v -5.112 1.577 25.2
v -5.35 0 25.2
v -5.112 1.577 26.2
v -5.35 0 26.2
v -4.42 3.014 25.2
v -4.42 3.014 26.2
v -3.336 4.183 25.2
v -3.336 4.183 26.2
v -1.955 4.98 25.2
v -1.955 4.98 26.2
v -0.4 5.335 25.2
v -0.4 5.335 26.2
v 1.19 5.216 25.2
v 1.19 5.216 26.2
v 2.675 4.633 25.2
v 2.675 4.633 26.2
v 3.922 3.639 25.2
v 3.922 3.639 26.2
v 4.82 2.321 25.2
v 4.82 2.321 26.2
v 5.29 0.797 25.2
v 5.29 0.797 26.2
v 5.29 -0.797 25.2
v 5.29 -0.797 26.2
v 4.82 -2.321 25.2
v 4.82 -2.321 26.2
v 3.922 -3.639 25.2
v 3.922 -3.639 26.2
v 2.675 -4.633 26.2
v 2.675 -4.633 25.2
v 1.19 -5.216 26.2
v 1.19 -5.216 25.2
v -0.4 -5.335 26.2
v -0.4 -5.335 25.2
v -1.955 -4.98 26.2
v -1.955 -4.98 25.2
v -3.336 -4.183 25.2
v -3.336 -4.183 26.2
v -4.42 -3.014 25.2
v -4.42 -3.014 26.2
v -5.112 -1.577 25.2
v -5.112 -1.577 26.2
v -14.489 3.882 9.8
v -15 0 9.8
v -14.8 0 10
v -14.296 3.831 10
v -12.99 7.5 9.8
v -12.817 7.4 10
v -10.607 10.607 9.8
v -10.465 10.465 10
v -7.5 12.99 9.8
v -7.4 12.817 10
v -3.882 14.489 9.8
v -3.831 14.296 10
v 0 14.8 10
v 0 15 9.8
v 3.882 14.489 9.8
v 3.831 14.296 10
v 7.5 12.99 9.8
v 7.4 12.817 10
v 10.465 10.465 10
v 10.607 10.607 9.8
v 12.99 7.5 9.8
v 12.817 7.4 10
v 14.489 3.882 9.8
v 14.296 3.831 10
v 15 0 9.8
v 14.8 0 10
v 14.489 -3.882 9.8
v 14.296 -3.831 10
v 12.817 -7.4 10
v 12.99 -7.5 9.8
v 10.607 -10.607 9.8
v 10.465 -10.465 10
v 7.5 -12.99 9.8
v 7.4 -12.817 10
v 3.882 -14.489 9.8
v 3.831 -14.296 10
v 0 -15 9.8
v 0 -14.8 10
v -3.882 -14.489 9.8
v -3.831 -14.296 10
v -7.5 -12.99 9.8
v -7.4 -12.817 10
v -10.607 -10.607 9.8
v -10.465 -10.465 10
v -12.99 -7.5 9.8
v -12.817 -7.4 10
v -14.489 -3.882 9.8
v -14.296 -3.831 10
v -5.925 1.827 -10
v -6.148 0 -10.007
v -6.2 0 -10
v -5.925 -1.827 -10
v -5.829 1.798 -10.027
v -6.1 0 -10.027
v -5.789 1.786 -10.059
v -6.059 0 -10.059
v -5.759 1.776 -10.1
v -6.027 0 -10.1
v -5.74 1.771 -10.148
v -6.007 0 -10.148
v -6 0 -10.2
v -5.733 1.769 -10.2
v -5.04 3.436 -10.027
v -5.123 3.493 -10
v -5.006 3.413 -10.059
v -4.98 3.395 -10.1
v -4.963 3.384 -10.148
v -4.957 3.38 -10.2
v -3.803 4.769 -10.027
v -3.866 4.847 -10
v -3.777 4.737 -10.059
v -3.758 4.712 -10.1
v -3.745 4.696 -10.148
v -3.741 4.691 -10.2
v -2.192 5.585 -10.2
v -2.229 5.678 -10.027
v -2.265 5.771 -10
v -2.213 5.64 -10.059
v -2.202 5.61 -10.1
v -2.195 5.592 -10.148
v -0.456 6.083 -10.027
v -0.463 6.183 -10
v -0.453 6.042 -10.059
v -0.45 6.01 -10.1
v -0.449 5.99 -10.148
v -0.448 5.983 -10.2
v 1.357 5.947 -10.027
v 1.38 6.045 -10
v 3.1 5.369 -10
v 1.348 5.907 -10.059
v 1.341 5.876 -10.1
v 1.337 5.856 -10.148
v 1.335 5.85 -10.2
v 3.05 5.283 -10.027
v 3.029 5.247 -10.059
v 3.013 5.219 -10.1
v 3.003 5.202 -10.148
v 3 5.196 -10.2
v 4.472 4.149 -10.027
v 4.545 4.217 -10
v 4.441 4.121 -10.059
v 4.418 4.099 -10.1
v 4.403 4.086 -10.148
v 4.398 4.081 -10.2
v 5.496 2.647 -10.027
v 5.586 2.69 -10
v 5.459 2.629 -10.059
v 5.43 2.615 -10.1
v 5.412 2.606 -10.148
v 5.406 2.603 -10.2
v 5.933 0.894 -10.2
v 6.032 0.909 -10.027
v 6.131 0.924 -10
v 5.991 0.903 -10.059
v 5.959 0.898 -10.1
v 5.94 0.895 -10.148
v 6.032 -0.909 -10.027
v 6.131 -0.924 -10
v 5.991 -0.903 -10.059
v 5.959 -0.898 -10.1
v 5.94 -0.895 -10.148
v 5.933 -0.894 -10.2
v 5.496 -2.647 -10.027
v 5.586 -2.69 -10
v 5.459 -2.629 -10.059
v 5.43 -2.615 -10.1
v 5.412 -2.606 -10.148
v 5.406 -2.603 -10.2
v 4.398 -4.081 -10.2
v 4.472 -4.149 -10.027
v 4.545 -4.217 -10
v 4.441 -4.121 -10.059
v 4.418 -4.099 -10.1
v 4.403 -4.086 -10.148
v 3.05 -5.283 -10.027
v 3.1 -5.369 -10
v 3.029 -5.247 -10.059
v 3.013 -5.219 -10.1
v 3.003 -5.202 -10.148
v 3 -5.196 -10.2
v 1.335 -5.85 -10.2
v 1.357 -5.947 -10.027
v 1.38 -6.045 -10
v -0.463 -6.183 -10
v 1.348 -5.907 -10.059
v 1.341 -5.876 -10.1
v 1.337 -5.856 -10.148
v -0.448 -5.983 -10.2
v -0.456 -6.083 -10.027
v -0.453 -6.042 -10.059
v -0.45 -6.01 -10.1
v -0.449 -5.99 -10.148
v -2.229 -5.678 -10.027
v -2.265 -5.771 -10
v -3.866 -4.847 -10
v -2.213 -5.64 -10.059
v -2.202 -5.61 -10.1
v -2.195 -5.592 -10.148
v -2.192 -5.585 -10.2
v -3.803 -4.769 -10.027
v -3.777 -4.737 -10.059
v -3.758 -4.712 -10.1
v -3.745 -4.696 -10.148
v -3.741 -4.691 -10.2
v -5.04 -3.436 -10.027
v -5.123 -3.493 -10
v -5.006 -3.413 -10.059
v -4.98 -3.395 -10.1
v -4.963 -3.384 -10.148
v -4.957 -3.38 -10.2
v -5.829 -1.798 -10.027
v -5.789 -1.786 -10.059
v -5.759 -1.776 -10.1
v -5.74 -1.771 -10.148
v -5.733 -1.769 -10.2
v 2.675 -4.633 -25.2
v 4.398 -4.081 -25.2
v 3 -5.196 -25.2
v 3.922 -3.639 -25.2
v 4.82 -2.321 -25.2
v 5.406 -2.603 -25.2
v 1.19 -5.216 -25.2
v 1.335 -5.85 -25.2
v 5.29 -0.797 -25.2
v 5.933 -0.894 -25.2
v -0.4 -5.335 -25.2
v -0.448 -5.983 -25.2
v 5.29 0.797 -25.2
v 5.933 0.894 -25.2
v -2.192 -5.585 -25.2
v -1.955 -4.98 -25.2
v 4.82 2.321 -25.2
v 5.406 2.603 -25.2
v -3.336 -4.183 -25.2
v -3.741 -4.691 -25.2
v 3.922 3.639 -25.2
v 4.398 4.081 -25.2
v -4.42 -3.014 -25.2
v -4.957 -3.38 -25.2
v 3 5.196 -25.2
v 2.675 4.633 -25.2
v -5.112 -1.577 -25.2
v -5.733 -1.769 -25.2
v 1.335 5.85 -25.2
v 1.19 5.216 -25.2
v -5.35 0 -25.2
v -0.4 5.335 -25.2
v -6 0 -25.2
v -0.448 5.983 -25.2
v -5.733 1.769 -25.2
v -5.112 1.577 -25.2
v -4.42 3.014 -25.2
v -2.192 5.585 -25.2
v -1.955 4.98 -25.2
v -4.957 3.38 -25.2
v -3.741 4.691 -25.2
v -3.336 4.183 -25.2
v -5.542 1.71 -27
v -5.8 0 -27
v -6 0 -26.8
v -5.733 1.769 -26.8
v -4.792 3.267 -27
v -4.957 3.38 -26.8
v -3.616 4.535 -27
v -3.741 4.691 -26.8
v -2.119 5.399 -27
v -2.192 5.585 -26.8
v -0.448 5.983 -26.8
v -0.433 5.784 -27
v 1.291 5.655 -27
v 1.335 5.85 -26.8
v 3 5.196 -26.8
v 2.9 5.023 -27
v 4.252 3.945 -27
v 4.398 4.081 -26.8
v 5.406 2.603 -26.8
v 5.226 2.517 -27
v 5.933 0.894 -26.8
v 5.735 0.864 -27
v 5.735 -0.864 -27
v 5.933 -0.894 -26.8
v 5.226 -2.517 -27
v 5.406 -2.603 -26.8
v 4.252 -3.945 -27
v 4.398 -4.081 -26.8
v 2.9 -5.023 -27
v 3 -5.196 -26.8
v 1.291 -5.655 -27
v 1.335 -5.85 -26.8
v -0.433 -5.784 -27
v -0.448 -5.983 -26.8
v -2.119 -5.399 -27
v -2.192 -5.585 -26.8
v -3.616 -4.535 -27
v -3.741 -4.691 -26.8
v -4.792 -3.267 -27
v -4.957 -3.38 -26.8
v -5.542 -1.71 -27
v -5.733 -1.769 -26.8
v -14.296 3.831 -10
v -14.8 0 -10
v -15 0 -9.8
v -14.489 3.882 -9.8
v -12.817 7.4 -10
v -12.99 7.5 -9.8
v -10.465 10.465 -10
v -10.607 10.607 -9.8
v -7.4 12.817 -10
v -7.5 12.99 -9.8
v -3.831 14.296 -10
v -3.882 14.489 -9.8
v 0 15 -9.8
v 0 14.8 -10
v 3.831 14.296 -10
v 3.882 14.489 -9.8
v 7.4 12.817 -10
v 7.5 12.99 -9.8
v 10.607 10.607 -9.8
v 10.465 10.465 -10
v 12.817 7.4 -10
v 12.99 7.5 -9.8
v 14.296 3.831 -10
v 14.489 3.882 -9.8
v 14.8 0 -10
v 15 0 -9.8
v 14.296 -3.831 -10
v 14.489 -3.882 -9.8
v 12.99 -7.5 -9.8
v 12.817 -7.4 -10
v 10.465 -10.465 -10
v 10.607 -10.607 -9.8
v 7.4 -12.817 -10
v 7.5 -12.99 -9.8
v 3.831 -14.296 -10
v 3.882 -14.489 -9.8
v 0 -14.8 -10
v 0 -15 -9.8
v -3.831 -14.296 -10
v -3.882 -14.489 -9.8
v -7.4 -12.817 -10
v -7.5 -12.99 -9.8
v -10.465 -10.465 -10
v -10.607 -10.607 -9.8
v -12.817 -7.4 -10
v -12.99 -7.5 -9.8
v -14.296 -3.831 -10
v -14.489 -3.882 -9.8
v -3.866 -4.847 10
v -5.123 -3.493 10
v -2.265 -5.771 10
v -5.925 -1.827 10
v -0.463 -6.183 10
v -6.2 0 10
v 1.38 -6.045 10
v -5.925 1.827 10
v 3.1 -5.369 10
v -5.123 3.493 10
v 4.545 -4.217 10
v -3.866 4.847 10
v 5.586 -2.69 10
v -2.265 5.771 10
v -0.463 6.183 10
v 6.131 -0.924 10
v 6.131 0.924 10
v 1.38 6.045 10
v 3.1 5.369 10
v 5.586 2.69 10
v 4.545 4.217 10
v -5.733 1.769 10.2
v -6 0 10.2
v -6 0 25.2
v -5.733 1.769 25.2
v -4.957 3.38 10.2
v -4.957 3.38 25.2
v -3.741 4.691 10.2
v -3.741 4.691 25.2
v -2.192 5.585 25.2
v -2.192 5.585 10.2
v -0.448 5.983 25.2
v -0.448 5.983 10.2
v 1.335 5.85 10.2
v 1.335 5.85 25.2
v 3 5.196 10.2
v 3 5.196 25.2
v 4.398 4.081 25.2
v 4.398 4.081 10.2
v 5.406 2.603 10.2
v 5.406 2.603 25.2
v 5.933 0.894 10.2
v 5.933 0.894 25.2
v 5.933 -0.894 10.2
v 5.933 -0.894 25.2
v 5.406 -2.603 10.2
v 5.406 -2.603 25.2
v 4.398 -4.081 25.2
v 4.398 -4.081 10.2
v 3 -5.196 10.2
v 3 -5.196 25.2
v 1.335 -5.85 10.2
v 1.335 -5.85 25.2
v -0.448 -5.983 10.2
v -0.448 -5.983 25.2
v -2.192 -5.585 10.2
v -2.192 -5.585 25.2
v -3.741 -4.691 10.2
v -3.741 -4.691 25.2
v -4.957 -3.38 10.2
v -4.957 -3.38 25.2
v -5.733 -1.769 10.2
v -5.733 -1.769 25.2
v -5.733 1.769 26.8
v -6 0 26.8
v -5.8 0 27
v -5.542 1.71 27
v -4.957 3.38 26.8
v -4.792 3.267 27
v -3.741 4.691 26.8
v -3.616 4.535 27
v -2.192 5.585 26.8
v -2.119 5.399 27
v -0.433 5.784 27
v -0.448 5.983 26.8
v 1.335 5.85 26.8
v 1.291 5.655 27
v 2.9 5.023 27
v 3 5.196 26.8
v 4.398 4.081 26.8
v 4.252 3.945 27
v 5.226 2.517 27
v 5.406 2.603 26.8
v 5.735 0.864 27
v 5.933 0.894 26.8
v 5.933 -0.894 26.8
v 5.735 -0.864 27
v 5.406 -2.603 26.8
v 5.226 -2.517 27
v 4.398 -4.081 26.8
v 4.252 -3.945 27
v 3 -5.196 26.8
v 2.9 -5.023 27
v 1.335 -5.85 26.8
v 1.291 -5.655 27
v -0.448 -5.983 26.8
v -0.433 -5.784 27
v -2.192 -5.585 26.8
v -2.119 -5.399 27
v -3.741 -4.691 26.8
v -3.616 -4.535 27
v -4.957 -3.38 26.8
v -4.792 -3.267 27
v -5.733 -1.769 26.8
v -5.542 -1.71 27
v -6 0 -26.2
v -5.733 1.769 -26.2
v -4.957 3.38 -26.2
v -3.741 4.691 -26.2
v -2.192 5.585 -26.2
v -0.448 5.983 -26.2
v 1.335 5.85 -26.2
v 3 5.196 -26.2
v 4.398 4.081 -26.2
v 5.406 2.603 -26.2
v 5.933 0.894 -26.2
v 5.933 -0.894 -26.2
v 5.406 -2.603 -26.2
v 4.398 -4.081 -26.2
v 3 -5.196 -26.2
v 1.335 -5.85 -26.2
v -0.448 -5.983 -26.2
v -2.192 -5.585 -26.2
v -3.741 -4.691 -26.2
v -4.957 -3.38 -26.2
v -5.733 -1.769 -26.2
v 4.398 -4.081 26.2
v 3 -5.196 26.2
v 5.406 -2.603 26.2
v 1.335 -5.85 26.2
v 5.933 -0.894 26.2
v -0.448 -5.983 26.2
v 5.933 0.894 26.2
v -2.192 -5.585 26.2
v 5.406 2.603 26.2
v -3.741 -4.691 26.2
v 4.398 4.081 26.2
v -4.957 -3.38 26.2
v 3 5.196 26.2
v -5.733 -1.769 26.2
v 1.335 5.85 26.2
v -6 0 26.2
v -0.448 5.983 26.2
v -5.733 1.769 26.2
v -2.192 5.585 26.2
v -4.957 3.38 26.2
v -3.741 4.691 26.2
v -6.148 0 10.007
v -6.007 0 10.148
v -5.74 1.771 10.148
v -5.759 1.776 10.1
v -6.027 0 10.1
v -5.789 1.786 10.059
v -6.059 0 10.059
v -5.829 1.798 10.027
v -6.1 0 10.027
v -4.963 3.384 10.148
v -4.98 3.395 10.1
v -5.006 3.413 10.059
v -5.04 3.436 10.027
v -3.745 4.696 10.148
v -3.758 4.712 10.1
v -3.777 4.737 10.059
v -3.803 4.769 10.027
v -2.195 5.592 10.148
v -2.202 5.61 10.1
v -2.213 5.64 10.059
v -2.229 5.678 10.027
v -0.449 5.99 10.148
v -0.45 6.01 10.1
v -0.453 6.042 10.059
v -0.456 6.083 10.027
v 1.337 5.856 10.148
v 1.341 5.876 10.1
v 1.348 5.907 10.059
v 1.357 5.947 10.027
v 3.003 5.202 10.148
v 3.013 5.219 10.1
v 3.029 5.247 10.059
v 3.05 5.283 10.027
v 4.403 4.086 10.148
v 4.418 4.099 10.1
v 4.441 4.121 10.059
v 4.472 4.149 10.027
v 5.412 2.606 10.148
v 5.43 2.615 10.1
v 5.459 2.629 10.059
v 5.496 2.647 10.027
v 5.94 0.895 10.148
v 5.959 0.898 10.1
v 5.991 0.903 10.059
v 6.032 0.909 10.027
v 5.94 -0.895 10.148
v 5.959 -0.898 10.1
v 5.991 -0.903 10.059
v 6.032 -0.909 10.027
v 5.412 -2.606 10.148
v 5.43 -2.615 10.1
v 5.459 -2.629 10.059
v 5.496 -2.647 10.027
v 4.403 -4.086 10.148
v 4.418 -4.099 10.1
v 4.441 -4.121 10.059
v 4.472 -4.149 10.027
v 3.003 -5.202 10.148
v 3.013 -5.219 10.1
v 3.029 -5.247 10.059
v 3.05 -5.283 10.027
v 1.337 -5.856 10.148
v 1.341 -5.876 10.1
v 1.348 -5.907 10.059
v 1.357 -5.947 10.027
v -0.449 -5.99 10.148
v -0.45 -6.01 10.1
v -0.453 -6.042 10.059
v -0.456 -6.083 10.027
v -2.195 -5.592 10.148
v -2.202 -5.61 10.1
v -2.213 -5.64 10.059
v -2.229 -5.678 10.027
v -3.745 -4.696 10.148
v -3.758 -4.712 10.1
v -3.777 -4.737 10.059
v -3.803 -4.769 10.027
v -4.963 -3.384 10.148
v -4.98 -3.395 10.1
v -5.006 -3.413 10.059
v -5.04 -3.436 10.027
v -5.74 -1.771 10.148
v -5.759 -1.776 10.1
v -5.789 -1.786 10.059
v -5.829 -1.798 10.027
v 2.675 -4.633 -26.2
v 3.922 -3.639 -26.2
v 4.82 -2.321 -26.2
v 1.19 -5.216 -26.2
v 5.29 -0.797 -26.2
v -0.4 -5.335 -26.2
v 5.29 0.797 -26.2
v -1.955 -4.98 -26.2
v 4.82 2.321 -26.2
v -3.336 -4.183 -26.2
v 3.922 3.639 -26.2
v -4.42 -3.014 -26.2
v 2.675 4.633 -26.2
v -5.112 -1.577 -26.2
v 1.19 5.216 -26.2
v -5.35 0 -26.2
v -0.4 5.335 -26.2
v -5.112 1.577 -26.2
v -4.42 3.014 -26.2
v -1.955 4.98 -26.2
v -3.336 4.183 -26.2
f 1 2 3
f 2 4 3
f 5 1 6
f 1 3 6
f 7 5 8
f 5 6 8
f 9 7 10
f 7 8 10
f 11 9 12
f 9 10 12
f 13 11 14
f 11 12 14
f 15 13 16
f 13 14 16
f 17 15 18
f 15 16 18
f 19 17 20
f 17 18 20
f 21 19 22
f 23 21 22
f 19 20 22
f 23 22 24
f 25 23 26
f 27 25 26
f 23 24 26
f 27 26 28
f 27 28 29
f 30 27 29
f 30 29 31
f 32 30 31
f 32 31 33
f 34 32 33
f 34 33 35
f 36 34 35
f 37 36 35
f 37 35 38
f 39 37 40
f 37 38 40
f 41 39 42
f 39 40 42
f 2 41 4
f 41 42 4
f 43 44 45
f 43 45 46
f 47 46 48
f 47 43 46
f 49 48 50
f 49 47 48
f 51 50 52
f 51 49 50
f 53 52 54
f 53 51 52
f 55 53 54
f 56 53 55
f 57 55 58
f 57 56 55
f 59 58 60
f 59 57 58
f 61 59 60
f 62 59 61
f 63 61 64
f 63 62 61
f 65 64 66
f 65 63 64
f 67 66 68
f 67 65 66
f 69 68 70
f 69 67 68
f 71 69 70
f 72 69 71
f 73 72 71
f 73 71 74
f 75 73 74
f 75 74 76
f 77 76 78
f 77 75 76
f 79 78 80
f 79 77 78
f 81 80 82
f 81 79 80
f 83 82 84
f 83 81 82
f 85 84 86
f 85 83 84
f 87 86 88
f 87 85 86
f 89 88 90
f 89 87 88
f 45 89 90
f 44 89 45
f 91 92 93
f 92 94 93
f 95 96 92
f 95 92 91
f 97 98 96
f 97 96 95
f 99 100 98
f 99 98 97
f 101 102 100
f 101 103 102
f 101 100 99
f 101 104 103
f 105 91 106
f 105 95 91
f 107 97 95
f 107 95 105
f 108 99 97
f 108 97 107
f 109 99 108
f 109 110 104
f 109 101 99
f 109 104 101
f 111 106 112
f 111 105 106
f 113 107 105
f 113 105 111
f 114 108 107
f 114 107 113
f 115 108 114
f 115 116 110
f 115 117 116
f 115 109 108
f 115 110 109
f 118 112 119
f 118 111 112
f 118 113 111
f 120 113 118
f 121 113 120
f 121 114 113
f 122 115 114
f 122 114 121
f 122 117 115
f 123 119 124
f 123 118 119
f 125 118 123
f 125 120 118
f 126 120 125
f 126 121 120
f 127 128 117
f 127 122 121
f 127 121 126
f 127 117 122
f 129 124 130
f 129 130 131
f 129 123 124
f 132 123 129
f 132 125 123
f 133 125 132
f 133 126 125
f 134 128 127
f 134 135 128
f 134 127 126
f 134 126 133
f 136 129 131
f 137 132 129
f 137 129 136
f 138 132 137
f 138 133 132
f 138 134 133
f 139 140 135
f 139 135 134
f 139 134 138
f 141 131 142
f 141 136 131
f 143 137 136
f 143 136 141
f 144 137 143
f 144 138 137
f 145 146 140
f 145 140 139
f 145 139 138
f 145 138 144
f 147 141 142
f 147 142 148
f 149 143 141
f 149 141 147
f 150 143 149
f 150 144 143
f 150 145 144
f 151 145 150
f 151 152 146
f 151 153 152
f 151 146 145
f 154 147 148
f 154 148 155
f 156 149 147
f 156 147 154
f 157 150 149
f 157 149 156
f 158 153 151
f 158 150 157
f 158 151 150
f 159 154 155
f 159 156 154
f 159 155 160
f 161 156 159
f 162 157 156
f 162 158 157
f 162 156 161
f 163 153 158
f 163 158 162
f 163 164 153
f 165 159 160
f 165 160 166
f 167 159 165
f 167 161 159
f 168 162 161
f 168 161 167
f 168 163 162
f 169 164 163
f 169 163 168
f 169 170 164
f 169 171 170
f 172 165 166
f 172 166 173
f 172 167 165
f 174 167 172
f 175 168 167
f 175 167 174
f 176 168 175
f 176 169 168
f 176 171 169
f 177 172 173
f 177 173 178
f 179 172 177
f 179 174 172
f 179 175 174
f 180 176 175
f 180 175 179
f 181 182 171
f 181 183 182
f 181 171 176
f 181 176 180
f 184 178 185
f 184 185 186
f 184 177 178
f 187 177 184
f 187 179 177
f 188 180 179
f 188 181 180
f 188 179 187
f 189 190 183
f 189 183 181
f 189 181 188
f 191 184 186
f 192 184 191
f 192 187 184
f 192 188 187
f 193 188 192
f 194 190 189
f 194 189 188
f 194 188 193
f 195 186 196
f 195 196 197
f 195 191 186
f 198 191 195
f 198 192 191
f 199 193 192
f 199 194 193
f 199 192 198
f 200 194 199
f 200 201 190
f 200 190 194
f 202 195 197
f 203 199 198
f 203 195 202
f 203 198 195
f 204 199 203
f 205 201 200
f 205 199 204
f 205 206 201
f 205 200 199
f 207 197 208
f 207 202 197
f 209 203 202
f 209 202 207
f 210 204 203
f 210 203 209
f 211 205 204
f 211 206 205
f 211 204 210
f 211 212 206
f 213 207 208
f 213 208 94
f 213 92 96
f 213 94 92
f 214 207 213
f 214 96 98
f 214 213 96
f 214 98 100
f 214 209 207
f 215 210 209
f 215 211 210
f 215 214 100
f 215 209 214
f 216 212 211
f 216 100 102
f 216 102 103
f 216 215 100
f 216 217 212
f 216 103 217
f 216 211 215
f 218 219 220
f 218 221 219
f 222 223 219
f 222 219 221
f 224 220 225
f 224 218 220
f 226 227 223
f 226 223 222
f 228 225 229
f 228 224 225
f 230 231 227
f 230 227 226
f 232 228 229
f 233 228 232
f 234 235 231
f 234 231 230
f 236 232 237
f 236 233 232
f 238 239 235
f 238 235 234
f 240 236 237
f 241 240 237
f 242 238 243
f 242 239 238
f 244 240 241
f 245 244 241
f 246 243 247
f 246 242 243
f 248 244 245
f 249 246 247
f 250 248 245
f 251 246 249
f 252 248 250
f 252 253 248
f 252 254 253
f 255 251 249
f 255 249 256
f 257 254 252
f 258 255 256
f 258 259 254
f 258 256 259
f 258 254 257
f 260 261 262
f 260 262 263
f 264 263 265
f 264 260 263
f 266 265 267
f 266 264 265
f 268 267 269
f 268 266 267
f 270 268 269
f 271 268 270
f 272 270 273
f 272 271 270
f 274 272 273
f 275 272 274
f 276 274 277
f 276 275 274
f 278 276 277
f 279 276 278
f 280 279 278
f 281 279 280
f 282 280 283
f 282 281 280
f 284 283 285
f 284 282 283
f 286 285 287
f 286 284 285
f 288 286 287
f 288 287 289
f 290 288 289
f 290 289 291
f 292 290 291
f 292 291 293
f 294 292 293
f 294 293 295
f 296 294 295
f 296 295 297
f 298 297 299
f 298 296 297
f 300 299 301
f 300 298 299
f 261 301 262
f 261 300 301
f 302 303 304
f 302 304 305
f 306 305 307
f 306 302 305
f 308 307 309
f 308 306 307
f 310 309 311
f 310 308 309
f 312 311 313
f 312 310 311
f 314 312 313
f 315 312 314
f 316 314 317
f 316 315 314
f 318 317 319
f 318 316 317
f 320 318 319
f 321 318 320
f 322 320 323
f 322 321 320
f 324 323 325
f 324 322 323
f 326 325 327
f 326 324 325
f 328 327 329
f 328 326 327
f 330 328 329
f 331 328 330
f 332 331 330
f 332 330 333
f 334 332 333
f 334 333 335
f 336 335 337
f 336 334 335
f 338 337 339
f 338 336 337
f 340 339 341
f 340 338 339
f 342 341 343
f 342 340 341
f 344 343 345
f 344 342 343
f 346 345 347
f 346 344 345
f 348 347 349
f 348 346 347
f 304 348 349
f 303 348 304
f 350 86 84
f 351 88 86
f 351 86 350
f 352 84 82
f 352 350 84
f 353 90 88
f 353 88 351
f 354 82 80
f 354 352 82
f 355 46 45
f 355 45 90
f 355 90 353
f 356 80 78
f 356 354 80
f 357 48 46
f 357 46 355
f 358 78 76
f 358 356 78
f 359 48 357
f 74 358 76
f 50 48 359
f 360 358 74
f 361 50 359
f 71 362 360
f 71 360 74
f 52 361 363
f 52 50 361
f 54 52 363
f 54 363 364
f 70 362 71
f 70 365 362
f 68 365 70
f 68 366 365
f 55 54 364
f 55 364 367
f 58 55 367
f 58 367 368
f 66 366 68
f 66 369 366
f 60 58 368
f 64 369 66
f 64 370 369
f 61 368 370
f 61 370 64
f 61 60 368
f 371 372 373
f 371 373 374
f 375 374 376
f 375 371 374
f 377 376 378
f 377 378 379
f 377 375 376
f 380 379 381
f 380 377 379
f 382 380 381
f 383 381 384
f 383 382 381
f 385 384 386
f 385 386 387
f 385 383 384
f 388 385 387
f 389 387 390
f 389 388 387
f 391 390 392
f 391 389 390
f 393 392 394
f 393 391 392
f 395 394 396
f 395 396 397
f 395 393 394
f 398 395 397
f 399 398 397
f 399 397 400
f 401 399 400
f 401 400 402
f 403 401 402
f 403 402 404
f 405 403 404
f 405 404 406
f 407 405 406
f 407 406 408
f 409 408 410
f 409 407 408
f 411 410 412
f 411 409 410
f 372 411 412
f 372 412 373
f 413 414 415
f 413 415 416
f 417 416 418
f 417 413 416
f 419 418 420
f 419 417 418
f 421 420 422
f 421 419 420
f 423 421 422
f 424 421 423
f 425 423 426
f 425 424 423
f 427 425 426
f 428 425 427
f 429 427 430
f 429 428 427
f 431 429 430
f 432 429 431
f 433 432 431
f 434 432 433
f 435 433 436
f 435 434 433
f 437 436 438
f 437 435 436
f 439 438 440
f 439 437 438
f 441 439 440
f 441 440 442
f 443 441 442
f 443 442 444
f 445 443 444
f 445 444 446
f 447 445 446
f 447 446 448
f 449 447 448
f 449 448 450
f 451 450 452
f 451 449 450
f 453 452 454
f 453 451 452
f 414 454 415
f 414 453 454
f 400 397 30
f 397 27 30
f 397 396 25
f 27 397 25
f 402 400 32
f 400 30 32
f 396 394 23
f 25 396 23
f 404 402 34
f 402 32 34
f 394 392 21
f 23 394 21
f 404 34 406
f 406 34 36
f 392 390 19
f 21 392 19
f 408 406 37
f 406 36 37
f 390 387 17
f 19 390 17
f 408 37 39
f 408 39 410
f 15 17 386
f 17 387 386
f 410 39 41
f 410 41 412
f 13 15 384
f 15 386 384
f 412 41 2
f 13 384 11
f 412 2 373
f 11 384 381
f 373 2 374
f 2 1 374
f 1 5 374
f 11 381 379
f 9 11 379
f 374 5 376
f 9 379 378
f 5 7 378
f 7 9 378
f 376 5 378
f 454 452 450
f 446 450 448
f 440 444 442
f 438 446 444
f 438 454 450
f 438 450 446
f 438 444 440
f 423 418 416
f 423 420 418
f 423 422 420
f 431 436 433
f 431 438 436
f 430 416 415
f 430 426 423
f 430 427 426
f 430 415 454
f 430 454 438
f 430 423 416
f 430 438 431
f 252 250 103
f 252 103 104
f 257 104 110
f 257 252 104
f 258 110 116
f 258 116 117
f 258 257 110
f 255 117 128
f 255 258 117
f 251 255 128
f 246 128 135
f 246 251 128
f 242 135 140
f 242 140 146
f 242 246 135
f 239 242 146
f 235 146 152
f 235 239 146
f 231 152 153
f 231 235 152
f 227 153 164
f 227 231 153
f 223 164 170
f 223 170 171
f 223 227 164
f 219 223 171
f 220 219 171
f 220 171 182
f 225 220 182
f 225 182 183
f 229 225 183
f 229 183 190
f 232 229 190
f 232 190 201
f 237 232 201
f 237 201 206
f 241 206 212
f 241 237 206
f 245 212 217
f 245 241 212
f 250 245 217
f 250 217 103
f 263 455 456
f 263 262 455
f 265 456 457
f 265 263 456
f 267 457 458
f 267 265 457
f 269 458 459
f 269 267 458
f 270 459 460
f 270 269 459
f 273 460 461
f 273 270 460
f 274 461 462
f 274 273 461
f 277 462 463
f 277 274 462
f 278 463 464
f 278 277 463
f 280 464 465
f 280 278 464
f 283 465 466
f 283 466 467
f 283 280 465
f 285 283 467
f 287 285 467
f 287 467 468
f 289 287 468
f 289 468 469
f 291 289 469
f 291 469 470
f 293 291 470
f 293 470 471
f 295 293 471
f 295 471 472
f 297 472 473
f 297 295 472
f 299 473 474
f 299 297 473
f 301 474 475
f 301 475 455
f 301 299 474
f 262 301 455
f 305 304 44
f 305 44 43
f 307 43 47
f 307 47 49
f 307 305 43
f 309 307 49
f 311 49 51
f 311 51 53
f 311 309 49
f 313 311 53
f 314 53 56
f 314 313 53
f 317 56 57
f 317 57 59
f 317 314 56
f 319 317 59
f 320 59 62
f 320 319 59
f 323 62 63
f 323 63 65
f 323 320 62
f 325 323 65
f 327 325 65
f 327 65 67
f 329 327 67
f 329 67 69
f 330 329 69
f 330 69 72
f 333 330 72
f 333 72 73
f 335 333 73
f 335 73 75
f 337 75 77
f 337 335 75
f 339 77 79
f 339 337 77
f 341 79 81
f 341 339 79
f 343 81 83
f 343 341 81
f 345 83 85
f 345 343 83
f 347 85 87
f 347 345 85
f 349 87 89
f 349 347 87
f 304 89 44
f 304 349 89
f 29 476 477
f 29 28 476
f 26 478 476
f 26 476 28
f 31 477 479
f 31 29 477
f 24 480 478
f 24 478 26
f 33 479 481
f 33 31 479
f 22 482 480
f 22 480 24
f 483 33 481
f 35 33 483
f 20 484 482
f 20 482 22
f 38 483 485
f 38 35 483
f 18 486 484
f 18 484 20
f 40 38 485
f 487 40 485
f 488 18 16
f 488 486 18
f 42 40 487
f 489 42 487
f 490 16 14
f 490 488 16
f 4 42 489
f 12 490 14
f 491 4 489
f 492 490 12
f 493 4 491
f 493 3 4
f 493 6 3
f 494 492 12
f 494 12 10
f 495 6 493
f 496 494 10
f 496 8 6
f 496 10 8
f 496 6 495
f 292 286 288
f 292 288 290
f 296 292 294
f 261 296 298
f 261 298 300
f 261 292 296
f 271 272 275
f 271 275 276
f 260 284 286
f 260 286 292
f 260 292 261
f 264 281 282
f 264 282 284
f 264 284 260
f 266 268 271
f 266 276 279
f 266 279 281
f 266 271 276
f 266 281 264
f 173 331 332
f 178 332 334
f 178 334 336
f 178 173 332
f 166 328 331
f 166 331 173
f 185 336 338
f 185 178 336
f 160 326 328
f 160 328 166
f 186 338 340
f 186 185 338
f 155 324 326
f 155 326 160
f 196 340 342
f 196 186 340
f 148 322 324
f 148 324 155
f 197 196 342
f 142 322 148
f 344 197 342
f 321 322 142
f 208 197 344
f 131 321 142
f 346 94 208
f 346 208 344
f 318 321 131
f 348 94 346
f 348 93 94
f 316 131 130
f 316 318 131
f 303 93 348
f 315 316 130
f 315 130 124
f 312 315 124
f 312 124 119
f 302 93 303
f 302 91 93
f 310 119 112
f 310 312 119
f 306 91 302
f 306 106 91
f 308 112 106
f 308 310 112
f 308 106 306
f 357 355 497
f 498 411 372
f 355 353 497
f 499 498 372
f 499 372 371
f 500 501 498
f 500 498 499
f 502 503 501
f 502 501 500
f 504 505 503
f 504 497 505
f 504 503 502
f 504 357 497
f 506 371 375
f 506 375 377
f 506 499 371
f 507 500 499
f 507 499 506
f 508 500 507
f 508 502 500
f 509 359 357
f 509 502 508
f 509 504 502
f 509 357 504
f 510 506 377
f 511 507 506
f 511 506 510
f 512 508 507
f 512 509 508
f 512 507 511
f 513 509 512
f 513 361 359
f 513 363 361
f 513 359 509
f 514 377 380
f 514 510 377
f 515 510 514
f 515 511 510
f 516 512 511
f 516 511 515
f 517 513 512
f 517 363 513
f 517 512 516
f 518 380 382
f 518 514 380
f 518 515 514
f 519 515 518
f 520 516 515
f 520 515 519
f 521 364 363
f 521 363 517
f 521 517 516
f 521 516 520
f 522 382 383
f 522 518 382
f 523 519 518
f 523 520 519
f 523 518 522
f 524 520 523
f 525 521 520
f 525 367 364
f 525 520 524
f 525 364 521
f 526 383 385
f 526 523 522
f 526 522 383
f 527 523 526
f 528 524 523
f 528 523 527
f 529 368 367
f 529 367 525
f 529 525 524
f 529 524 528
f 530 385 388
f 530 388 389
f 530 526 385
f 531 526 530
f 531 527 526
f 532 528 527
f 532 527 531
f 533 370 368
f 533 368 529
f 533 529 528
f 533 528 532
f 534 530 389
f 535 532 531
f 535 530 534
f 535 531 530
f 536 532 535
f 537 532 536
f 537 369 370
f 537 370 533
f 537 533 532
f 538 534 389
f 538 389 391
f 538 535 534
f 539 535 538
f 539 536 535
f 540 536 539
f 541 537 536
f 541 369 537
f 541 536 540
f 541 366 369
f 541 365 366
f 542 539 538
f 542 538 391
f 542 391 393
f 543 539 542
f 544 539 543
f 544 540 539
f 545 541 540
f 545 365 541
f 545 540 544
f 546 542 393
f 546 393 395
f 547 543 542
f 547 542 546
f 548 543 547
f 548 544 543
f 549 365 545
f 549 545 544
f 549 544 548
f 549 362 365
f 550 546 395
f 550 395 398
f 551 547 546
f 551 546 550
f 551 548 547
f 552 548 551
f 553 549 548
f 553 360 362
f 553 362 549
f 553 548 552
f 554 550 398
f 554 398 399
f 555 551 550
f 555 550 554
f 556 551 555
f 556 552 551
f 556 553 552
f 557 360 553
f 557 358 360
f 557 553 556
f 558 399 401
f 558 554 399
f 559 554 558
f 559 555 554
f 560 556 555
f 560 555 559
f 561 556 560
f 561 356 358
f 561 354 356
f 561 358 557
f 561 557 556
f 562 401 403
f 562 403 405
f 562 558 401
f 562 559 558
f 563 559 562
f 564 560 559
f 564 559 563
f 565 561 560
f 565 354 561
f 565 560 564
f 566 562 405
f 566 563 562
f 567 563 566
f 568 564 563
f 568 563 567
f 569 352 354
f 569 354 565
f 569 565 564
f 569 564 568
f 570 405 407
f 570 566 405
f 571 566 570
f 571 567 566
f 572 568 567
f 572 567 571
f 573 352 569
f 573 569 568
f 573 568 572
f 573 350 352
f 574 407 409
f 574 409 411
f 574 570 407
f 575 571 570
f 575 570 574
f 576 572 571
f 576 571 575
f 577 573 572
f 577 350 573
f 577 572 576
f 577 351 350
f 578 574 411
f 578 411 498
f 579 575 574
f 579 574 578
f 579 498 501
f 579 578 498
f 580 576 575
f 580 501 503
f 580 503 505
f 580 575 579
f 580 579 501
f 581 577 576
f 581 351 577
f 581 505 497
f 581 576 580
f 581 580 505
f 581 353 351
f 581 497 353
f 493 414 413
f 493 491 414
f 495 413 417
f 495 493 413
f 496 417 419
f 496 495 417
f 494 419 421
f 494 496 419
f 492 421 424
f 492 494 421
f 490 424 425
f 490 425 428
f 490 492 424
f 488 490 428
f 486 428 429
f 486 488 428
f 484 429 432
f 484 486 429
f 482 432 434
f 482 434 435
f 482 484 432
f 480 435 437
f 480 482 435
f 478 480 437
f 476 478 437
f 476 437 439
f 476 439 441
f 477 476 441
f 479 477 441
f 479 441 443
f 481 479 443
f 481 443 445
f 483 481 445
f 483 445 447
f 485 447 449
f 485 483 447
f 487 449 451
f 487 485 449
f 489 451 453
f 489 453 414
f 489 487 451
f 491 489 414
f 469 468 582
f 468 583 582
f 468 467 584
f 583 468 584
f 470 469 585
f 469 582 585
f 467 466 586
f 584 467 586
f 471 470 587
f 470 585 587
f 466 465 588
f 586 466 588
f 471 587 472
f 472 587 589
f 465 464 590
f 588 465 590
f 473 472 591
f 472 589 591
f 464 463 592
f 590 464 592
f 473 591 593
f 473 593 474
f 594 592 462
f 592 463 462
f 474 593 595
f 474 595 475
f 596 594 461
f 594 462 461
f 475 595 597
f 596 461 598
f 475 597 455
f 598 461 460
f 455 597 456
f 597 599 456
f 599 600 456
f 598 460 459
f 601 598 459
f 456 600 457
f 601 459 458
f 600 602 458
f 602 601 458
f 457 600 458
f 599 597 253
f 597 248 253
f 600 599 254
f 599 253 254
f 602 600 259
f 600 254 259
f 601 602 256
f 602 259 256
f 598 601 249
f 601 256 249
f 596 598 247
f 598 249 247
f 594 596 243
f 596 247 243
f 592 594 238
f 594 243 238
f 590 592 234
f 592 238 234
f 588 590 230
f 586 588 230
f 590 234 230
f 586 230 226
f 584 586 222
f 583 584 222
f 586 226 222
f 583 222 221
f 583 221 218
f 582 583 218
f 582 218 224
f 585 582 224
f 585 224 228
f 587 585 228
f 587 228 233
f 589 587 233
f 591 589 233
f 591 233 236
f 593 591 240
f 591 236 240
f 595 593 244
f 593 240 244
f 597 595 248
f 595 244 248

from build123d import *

# Parameters (mm, degrees)
F2_SIZE = 0.2
F3_W    = 0.65
F3_H    = 1
F5_R    = 0.2


with BuildPart() as f1:
    # F0 (on Front) → F1 (revolve)
    with BuildSketch(Plane.XZ):
        Polygon((0, -27), (0, 27), (-6, 27), (-6, 10), (-15, 10), (-15, -10), (-6, -10), (-6, -27), align=None)
    revolve(axis=Axis((0, 0, 3.962264), (0, 0, -1)))

    # F2
    f2_edges = [f1.edges().sort_by_distance(p)[0] for p in [
        (6, 0, 27),
        (15, 0, 10),
        (15, 0, -10),
        (6, 0, -27),
    ]]
    chamfer(f2_edges, length=F2_SIZE)

    # F3 (on Front) → F4 (revolve, cut)
    with BuildSketch(Plane.XZ):
        with Locations((-5.675, 25.7)):
            Rectangle(F3_W, F3_H)
        with Locations((-5.675, -25.7)):
            Rectangle(F3_W, F3_H)
    revolve(axis=Axis((0, 0, -1.776566), (0, 0, -1)), mode=Mode.SUBTRACT)

    # F5
    f5_edges = [f1.edges().sort_by_distance(p)[0] for p in [
        (6, 0, 10),
        (6, 0, -10),
    ]]
    fillet(f5_edges, radius=F5_R)


solid = f1.part
